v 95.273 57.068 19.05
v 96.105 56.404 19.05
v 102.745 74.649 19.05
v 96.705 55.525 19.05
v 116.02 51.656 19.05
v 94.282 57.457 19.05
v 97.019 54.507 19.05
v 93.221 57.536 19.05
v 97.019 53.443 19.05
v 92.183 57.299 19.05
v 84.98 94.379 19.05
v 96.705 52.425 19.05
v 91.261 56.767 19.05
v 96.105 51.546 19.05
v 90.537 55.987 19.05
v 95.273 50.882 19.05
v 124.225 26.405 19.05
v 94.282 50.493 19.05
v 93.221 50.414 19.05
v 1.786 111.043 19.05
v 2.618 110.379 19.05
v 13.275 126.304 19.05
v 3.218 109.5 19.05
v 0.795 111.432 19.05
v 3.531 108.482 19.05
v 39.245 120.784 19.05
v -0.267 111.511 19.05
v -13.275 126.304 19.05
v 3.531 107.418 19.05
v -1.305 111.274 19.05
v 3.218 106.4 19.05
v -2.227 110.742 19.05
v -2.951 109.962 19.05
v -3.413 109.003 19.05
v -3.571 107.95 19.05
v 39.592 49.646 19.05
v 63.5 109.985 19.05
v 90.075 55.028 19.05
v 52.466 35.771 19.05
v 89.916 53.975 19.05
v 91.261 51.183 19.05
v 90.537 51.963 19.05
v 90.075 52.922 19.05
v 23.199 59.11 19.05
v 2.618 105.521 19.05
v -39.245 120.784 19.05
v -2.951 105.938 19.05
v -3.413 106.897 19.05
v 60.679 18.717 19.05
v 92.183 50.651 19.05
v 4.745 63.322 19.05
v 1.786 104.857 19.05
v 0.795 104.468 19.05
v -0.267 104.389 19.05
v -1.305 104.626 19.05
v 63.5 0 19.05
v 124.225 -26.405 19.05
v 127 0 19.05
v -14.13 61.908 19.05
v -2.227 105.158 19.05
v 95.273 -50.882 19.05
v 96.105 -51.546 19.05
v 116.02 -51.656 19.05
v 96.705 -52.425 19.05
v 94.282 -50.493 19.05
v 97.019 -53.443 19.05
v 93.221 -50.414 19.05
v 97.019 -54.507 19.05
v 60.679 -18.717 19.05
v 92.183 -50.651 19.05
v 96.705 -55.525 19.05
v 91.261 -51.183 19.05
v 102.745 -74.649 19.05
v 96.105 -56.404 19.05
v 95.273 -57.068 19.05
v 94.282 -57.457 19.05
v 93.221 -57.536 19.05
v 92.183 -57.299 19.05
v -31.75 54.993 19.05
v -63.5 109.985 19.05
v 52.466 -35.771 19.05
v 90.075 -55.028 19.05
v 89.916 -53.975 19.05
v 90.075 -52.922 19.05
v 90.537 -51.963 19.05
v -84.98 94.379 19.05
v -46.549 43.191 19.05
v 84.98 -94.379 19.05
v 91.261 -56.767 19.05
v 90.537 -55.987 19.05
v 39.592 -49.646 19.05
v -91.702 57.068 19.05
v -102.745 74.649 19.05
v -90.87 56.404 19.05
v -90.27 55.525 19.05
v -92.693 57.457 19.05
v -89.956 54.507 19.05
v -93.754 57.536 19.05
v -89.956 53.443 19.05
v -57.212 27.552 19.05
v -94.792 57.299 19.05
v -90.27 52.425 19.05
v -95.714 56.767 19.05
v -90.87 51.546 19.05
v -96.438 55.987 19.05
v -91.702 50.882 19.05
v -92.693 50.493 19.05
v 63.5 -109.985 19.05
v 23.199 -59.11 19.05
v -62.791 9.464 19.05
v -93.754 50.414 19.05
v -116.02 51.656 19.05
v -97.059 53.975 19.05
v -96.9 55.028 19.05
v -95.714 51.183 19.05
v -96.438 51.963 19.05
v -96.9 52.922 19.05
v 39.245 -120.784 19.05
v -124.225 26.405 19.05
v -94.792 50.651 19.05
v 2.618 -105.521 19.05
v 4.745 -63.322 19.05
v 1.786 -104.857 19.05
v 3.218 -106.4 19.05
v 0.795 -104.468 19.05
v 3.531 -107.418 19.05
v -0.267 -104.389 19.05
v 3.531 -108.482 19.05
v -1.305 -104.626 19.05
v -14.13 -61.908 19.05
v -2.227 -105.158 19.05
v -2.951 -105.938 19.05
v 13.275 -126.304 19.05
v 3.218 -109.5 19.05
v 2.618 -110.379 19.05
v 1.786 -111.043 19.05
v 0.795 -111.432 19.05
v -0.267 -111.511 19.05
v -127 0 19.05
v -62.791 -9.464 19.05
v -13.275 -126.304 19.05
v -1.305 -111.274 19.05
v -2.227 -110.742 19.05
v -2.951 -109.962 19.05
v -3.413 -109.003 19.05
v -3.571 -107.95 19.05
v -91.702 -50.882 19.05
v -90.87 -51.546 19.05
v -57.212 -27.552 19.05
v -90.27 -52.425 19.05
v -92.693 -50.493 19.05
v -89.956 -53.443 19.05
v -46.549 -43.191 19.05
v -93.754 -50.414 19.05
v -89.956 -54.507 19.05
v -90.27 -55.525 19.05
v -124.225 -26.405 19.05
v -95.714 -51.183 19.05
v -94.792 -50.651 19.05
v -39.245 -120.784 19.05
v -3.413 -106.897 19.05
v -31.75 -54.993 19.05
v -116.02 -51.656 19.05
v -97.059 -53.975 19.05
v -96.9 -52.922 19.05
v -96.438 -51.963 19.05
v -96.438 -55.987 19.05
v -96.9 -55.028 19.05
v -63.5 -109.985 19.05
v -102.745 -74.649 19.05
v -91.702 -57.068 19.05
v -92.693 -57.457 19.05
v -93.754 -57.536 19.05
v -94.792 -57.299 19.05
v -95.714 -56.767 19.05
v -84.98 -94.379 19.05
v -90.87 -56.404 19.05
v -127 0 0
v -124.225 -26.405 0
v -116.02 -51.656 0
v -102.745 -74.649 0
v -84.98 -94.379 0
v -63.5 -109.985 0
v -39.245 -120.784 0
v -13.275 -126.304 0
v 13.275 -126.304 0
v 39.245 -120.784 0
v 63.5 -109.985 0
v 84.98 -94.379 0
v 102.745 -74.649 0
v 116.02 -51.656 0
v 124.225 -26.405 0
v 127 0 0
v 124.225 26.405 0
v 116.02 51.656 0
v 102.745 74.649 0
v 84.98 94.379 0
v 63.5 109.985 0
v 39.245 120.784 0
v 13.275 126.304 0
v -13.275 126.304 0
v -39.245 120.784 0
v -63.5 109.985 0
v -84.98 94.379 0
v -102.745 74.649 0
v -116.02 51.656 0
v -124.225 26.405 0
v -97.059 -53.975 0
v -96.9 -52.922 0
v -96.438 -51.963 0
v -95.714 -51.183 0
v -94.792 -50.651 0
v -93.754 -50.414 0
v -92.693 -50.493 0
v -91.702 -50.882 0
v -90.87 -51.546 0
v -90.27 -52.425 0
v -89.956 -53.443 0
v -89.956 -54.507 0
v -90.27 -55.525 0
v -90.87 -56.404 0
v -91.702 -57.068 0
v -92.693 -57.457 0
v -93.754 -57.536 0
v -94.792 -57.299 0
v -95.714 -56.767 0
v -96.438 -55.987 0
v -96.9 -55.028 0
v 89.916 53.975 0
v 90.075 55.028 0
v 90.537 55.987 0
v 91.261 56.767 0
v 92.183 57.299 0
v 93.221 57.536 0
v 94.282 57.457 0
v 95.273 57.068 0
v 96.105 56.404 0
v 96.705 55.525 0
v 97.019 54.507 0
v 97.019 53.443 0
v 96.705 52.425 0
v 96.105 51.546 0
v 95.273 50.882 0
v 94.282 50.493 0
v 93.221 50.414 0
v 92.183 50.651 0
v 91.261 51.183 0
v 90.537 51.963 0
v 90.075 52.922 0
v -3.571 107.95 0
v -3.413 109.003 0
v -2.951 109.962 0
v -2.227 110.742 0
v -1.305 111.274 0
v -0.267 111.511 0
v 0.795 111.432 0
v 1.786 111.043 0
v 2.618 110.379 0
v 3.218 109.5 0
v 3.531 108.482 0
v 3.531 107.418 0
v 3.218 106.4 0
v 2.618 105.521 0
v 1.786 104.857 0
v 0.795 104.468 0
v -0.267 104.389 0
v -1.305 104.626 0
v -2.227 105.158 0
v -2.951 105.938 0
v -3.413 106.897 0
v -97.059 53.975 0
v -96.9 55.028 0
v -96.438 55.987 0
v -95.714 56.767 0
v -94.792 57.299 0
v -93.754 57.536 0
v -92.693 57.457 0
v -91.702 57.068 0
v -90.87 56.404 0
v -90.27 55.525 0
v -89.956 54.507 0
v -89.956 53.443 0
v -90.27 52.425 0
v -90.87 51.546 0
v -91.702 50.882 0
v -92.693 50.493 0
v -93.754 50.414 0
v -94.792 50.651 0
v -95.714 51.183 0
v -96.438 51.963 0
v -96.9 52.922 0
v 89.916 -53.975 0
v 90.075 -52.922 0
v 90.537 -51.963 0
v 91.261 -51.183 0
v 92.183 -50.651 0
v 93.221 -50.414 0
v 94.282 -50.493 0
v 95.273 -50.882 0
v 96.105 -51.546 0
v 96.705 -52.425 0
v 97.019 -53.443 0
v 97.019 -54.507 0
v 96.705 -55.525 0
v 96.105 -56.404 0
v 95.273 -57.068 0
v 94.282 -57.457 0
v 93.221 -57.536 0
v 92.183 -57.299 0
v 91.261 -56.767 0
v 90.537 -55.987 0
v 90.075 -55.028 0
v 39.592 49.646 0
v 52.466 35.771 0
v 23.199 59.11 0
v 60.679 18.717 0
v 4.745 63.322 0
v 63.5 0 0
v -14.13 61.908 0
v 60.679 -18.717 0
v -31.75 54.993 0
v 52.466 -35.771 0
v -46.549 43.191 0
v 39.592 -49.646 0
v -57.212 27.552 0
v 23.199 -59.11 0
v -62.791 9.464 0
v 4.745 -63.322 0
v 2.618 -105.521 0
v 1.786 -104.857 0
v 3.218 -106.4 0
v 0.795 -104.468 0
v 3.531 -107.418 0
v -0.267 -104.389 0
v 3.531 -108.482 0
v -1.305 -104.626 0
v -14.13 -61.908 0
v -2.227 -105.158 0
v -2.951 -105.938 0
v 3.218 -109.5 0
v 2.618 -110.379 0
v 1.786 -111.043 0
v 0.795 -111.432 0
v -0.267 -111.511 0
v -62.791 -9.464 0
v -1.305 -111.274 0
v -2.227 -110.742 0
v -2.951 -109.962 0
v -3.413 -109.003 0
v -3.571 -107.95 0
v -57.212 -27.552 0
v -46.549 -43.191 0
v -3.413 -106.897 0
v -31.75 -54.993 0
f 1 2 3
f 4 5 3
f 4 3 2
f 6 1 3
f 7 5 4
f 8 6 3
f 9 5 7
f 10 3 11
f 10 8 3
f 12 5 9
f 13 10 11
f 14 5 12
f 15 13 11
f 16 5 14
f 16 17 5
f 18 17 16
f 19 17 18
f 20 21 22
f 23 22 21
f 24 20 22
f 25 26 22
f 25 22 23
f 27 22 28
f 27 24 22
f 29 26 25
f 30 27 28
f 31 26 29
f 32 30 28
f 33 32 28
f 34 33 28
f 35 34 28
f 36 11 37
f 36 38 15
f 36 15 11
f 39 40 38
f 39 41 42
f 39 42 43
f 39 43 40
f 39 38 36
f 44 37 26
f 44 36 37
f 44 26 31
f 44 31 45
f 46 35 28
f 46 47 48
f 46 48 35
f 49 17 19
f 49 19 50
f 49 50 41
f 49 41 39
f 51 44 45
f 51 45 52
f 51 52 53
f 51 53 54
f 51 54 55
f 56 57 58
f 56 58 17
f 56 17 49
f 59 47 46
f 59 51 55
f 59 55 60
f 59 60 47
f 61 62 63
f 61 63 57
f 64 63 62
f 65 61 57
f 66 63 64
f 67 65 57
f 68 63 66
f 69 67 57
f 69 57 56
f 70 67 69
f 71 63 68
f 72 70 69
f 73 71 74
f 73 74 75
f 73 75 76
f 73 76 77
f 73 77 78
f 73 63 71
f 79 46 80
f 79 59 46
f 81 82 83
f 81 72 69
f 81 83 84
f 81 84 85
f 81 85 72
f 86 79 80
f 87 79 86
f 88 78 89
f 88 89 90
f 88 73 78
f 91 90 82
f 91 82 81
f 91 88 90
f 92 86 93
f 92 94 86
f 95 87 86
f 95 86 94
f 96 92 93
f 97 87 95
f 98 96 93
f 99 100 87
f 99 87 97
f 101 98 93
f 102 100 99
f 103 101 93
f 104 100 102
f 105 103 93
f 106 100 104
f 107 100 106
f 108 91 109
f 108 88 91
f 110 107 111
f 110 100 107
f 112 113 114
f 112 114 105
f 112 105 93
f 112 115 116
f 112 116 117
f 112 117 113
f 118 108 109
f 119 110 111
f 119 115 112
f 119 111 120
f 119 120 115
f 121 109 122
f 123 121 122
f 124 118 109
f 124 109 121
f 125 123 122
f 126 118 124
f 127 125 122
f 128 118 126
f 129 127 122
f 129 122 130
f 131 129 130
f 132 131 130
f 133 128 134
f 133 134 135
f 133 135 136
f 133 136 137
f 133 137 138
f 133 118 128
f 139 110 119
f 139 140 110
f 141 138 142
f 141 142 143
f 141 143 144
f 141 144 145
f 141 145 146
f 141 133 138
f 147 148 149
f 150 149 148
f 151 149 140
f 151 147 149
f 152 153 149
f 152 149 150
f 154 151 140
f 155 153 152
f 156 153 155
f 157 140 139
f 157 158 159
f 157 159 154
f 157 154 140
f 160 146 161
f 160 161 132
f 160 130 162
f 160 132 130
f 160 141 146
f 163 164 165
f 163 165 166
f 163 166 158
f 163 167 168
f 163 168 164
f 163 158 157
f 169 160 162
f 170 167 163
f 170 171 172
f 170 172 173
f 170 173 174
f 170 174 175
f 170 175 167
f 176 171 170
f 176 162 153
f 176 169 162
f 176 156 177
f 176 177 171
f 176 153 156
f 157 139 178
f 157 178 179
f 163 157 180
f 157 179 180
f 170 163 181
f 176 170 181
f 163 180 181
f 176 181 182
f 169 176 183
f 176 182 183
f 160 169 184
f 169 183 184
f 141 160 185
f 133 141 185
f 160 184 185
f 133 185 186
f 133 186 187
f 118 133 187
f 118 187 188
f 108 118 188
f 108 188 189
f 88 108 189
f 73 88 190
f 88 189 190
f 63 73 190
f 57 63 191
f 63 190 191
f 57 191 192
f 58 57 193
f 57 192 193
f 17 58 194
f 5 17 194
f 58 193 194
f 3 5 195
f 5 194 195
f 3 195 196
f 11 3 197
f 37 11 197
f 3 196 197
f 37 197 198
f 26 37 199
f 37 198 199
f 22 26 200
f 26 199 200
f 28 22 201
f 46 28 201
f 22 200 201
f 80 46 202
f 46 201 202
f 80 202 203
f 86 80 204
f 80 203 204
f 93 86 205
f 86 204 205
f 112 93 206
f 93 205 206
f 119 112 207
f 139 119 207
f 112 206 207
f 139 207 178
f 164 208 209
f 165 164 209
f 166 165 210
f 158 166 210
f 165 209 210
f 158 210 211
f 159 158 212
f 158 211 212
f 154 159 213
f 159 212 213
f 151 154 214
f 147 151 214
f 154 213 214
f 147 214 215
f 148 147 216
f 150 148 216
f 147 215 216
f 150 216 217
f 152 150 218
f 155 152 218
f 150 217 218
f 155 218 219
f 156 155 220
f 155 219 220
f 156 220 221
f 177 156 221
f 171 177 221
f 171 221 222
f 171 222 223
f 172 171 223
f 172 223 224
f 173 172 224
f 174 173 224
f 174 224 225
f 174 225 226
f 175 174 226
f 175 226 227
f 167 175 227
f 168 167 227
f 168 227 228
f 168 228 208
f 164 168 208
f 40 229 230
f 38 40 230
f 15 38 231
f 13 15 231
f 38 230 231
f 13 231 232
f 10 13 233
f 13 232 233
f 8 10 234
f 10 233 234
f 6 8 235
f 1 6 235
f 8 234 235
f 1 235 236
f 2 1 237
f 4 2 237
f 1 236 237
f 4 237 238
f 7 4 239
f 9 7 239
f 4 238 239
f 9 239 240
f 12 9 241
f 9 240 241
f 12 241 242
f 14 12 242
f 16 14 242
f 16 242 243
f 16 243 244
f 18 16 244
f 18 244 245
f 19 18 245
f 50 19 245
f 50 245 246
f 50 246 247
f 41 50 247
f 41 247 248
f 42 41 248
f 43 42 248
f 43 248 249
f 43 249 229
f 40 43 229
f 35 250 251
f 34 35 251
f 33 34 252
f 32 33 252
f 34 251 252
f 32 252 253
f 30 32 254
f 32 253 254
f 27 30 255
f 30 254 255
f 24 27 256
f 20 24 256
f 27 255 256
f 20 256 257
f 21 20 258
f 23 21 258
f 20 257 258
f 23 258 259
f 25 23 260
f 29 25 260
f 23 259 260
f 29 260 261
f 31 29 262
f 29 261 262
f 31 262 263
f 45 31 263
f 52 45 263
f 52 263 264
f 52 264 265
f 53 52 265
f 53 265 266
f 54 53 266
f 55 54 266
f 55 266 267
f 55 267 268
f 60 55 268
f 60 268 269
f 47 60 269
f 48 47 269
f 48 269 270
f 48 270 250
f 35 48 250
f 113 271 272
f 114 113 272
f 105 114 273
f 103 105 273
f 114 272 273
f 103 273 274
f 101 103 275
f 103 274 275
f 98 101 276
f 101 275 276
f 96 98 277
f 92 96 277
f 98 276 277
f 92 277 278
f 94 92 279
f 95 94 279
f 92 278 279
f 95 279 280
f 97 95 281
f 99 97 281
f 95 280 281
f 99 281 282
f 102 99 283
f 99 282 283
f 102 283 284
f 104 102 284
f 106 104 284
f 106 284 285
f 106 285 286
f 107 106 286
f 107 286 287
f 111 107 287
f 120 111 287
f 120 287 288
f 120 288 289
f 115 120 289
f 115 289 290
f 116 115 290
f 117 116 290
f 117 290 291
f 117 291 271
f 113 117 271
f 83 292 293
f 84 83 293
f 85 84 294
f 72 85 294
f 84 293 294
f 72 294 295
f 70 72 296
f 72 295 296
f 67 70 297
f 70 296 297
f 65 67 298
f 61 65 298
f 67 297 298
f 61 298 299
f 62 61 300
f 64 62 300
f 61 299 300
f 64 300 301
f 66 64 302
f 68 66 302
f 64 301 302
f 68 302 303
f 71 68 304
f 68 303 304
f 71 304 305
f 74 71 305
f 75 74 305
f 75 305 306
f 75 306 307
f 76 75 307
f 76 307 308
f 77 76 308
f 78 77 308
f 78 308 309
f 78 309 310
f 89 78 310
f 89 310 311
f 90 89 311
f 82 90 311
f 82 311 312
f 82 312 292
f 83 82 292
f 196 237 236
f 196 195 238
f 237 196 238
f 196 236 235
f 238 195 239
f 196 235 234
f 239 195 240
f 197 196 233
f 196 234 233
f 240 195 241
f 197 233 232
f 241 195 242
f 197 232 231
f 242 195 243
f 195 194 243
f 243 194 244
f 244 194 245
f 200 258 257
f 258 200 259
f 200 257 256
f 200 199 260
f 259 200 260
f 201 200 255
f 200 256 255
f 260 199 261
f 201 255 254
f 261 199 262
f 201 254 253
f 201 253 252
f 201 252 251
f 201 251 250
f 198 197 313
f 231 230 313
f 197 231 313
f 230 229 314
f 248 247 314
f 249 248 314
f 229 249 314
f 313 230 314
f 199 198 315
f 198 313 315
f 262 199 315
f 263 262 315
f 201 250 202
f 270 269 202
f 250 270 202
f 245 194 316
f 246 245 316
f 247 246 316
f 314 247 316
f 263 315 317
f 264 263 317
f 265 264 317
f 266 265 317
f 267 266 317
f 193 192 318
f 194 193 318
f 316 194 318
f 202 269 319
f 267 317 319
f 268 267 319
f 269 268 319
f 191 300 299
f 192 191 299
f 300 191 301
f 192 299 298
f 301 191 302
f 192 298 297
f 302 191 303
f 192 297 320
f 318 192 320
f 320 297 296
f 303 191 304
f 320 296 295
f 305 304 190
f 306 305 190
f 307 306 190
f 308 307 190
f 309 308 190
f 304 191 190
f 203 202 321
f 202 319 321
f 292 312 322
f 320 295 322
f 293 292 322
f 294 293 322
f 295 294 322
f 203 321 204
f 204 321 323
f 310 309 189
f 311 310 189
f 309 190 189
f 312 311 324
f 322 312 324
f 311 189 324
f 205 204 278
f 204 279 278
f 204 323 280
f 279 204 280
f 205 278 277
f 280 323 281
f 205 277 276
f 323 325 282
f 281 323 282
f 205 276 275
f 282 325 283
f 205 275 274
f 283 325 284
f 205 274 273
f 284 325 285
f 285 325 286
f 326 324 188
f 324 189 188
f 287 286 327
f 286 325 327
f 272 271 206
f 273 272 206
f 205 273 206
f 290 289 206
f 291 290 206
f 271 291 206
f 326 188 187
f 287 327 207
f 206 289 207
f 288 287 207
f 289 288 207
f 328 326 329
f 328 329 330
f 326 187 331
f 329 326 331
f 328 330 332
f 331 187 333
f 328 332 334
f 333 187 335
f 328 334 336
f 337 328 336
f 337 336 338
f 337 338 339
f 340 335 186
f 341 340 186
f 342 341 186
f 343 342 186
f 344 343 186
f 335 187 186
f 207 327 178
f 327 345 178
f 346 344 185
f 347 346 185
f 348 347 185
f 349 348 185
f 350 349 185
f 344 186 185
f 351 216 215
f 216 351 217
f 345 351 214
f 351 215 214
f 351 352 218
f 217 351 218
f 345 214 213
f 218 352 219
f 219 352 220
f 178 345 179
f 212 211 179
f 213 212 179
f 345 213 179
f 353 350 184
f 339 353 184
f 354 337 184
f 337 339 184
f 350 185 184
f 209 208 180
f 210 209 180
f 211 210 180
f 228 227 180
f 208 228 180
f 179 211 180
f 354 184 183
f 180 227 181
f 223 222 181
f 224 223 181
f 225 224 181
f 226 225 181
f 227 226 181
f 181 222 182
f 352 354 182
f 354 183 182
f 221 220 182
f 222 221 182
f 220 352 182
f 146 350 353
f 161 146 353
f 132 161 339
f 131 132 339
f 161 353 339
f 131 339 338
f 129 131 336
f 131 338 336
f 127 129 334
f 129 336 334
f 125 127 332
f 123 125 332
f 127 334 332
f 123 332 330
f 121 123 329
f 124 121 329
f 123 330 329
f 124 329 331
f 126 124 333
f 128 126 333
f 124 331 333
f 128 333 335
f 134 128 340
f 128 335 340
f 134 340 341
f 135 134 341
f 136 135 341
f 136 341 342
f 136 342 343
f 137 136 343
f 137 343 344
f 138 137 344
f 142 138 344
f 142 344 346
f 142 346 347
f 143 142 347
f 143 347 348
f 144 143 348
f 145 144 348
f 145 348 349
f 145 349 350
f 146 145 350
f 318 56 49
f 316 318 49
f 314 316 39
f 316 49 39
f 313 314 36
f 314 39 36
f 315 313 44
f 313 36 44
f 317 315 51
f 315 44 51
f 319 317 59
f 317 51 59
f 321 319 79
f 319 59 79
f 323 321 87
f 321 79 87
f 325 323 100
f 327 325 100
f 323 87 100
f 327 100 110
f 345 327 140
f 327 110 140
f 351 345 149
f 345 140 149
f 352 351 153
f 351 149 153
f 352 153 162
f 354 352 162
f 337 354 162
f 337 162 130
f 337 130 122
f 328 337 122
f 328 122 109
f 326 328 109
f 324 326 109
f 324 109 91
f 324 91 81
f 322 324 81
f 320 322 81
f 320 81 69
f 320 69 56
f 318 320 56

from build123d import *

# Parameters (mm, degrees)
SKETCH1_R               = 127
BOSS_EXTRUDE1_DEPTH     = 19.05
F_1_4_CLEARANCE_HOLE1_D = 7.14248
CUT_EXTRUDE1_REACH      = 182.613
SKETCH4_R               = 63.5


with BuildPart() as part:
    # Sketch1 → Boss-Extrude1 (new body)
    with BuildSketch(Plane.XY):
        with Locations(Location((0, 0, 0), (0, 0, 180))):
            Circle(SKETCH1_R)
    extrude(amount=BOSS_EXTRUDE1_DEPTH)

    # 1/4 Clearance Hole1 (through all)
    with Locations(Plane.XY.offset(19.05)):
        with Locations((-93.487442339, 53.975), (0, 107.95), (93.487442339, 53.975), (93.487442339, -53.975), (0, -107.95), (-93.487442339, -53.975)):
            Hole(F_1_4_CLEARANCE_HOLE1_D / 2)

    # Sketch4 → Cut-Extrude1 (cut, up to next)
    with BuildSketch(Plane.XY.offset(19.05), mode=Mode.PRIVATE) as cut_extrude1_sk1:
        Circle(SKETCH4_R)
    cut_extrude1_tool1 = extrude(cut_extrude1_sk1.sketch, amount=-CUT_EXTRUDE1_REACH, mode=Mode.PRIVATE) & part.part
    add(cut_extrude1_tool1.solids().sort_by_distance((0, 0, 19.05))[0], mode=Mode.SUBTRACT)


solid = part.part
